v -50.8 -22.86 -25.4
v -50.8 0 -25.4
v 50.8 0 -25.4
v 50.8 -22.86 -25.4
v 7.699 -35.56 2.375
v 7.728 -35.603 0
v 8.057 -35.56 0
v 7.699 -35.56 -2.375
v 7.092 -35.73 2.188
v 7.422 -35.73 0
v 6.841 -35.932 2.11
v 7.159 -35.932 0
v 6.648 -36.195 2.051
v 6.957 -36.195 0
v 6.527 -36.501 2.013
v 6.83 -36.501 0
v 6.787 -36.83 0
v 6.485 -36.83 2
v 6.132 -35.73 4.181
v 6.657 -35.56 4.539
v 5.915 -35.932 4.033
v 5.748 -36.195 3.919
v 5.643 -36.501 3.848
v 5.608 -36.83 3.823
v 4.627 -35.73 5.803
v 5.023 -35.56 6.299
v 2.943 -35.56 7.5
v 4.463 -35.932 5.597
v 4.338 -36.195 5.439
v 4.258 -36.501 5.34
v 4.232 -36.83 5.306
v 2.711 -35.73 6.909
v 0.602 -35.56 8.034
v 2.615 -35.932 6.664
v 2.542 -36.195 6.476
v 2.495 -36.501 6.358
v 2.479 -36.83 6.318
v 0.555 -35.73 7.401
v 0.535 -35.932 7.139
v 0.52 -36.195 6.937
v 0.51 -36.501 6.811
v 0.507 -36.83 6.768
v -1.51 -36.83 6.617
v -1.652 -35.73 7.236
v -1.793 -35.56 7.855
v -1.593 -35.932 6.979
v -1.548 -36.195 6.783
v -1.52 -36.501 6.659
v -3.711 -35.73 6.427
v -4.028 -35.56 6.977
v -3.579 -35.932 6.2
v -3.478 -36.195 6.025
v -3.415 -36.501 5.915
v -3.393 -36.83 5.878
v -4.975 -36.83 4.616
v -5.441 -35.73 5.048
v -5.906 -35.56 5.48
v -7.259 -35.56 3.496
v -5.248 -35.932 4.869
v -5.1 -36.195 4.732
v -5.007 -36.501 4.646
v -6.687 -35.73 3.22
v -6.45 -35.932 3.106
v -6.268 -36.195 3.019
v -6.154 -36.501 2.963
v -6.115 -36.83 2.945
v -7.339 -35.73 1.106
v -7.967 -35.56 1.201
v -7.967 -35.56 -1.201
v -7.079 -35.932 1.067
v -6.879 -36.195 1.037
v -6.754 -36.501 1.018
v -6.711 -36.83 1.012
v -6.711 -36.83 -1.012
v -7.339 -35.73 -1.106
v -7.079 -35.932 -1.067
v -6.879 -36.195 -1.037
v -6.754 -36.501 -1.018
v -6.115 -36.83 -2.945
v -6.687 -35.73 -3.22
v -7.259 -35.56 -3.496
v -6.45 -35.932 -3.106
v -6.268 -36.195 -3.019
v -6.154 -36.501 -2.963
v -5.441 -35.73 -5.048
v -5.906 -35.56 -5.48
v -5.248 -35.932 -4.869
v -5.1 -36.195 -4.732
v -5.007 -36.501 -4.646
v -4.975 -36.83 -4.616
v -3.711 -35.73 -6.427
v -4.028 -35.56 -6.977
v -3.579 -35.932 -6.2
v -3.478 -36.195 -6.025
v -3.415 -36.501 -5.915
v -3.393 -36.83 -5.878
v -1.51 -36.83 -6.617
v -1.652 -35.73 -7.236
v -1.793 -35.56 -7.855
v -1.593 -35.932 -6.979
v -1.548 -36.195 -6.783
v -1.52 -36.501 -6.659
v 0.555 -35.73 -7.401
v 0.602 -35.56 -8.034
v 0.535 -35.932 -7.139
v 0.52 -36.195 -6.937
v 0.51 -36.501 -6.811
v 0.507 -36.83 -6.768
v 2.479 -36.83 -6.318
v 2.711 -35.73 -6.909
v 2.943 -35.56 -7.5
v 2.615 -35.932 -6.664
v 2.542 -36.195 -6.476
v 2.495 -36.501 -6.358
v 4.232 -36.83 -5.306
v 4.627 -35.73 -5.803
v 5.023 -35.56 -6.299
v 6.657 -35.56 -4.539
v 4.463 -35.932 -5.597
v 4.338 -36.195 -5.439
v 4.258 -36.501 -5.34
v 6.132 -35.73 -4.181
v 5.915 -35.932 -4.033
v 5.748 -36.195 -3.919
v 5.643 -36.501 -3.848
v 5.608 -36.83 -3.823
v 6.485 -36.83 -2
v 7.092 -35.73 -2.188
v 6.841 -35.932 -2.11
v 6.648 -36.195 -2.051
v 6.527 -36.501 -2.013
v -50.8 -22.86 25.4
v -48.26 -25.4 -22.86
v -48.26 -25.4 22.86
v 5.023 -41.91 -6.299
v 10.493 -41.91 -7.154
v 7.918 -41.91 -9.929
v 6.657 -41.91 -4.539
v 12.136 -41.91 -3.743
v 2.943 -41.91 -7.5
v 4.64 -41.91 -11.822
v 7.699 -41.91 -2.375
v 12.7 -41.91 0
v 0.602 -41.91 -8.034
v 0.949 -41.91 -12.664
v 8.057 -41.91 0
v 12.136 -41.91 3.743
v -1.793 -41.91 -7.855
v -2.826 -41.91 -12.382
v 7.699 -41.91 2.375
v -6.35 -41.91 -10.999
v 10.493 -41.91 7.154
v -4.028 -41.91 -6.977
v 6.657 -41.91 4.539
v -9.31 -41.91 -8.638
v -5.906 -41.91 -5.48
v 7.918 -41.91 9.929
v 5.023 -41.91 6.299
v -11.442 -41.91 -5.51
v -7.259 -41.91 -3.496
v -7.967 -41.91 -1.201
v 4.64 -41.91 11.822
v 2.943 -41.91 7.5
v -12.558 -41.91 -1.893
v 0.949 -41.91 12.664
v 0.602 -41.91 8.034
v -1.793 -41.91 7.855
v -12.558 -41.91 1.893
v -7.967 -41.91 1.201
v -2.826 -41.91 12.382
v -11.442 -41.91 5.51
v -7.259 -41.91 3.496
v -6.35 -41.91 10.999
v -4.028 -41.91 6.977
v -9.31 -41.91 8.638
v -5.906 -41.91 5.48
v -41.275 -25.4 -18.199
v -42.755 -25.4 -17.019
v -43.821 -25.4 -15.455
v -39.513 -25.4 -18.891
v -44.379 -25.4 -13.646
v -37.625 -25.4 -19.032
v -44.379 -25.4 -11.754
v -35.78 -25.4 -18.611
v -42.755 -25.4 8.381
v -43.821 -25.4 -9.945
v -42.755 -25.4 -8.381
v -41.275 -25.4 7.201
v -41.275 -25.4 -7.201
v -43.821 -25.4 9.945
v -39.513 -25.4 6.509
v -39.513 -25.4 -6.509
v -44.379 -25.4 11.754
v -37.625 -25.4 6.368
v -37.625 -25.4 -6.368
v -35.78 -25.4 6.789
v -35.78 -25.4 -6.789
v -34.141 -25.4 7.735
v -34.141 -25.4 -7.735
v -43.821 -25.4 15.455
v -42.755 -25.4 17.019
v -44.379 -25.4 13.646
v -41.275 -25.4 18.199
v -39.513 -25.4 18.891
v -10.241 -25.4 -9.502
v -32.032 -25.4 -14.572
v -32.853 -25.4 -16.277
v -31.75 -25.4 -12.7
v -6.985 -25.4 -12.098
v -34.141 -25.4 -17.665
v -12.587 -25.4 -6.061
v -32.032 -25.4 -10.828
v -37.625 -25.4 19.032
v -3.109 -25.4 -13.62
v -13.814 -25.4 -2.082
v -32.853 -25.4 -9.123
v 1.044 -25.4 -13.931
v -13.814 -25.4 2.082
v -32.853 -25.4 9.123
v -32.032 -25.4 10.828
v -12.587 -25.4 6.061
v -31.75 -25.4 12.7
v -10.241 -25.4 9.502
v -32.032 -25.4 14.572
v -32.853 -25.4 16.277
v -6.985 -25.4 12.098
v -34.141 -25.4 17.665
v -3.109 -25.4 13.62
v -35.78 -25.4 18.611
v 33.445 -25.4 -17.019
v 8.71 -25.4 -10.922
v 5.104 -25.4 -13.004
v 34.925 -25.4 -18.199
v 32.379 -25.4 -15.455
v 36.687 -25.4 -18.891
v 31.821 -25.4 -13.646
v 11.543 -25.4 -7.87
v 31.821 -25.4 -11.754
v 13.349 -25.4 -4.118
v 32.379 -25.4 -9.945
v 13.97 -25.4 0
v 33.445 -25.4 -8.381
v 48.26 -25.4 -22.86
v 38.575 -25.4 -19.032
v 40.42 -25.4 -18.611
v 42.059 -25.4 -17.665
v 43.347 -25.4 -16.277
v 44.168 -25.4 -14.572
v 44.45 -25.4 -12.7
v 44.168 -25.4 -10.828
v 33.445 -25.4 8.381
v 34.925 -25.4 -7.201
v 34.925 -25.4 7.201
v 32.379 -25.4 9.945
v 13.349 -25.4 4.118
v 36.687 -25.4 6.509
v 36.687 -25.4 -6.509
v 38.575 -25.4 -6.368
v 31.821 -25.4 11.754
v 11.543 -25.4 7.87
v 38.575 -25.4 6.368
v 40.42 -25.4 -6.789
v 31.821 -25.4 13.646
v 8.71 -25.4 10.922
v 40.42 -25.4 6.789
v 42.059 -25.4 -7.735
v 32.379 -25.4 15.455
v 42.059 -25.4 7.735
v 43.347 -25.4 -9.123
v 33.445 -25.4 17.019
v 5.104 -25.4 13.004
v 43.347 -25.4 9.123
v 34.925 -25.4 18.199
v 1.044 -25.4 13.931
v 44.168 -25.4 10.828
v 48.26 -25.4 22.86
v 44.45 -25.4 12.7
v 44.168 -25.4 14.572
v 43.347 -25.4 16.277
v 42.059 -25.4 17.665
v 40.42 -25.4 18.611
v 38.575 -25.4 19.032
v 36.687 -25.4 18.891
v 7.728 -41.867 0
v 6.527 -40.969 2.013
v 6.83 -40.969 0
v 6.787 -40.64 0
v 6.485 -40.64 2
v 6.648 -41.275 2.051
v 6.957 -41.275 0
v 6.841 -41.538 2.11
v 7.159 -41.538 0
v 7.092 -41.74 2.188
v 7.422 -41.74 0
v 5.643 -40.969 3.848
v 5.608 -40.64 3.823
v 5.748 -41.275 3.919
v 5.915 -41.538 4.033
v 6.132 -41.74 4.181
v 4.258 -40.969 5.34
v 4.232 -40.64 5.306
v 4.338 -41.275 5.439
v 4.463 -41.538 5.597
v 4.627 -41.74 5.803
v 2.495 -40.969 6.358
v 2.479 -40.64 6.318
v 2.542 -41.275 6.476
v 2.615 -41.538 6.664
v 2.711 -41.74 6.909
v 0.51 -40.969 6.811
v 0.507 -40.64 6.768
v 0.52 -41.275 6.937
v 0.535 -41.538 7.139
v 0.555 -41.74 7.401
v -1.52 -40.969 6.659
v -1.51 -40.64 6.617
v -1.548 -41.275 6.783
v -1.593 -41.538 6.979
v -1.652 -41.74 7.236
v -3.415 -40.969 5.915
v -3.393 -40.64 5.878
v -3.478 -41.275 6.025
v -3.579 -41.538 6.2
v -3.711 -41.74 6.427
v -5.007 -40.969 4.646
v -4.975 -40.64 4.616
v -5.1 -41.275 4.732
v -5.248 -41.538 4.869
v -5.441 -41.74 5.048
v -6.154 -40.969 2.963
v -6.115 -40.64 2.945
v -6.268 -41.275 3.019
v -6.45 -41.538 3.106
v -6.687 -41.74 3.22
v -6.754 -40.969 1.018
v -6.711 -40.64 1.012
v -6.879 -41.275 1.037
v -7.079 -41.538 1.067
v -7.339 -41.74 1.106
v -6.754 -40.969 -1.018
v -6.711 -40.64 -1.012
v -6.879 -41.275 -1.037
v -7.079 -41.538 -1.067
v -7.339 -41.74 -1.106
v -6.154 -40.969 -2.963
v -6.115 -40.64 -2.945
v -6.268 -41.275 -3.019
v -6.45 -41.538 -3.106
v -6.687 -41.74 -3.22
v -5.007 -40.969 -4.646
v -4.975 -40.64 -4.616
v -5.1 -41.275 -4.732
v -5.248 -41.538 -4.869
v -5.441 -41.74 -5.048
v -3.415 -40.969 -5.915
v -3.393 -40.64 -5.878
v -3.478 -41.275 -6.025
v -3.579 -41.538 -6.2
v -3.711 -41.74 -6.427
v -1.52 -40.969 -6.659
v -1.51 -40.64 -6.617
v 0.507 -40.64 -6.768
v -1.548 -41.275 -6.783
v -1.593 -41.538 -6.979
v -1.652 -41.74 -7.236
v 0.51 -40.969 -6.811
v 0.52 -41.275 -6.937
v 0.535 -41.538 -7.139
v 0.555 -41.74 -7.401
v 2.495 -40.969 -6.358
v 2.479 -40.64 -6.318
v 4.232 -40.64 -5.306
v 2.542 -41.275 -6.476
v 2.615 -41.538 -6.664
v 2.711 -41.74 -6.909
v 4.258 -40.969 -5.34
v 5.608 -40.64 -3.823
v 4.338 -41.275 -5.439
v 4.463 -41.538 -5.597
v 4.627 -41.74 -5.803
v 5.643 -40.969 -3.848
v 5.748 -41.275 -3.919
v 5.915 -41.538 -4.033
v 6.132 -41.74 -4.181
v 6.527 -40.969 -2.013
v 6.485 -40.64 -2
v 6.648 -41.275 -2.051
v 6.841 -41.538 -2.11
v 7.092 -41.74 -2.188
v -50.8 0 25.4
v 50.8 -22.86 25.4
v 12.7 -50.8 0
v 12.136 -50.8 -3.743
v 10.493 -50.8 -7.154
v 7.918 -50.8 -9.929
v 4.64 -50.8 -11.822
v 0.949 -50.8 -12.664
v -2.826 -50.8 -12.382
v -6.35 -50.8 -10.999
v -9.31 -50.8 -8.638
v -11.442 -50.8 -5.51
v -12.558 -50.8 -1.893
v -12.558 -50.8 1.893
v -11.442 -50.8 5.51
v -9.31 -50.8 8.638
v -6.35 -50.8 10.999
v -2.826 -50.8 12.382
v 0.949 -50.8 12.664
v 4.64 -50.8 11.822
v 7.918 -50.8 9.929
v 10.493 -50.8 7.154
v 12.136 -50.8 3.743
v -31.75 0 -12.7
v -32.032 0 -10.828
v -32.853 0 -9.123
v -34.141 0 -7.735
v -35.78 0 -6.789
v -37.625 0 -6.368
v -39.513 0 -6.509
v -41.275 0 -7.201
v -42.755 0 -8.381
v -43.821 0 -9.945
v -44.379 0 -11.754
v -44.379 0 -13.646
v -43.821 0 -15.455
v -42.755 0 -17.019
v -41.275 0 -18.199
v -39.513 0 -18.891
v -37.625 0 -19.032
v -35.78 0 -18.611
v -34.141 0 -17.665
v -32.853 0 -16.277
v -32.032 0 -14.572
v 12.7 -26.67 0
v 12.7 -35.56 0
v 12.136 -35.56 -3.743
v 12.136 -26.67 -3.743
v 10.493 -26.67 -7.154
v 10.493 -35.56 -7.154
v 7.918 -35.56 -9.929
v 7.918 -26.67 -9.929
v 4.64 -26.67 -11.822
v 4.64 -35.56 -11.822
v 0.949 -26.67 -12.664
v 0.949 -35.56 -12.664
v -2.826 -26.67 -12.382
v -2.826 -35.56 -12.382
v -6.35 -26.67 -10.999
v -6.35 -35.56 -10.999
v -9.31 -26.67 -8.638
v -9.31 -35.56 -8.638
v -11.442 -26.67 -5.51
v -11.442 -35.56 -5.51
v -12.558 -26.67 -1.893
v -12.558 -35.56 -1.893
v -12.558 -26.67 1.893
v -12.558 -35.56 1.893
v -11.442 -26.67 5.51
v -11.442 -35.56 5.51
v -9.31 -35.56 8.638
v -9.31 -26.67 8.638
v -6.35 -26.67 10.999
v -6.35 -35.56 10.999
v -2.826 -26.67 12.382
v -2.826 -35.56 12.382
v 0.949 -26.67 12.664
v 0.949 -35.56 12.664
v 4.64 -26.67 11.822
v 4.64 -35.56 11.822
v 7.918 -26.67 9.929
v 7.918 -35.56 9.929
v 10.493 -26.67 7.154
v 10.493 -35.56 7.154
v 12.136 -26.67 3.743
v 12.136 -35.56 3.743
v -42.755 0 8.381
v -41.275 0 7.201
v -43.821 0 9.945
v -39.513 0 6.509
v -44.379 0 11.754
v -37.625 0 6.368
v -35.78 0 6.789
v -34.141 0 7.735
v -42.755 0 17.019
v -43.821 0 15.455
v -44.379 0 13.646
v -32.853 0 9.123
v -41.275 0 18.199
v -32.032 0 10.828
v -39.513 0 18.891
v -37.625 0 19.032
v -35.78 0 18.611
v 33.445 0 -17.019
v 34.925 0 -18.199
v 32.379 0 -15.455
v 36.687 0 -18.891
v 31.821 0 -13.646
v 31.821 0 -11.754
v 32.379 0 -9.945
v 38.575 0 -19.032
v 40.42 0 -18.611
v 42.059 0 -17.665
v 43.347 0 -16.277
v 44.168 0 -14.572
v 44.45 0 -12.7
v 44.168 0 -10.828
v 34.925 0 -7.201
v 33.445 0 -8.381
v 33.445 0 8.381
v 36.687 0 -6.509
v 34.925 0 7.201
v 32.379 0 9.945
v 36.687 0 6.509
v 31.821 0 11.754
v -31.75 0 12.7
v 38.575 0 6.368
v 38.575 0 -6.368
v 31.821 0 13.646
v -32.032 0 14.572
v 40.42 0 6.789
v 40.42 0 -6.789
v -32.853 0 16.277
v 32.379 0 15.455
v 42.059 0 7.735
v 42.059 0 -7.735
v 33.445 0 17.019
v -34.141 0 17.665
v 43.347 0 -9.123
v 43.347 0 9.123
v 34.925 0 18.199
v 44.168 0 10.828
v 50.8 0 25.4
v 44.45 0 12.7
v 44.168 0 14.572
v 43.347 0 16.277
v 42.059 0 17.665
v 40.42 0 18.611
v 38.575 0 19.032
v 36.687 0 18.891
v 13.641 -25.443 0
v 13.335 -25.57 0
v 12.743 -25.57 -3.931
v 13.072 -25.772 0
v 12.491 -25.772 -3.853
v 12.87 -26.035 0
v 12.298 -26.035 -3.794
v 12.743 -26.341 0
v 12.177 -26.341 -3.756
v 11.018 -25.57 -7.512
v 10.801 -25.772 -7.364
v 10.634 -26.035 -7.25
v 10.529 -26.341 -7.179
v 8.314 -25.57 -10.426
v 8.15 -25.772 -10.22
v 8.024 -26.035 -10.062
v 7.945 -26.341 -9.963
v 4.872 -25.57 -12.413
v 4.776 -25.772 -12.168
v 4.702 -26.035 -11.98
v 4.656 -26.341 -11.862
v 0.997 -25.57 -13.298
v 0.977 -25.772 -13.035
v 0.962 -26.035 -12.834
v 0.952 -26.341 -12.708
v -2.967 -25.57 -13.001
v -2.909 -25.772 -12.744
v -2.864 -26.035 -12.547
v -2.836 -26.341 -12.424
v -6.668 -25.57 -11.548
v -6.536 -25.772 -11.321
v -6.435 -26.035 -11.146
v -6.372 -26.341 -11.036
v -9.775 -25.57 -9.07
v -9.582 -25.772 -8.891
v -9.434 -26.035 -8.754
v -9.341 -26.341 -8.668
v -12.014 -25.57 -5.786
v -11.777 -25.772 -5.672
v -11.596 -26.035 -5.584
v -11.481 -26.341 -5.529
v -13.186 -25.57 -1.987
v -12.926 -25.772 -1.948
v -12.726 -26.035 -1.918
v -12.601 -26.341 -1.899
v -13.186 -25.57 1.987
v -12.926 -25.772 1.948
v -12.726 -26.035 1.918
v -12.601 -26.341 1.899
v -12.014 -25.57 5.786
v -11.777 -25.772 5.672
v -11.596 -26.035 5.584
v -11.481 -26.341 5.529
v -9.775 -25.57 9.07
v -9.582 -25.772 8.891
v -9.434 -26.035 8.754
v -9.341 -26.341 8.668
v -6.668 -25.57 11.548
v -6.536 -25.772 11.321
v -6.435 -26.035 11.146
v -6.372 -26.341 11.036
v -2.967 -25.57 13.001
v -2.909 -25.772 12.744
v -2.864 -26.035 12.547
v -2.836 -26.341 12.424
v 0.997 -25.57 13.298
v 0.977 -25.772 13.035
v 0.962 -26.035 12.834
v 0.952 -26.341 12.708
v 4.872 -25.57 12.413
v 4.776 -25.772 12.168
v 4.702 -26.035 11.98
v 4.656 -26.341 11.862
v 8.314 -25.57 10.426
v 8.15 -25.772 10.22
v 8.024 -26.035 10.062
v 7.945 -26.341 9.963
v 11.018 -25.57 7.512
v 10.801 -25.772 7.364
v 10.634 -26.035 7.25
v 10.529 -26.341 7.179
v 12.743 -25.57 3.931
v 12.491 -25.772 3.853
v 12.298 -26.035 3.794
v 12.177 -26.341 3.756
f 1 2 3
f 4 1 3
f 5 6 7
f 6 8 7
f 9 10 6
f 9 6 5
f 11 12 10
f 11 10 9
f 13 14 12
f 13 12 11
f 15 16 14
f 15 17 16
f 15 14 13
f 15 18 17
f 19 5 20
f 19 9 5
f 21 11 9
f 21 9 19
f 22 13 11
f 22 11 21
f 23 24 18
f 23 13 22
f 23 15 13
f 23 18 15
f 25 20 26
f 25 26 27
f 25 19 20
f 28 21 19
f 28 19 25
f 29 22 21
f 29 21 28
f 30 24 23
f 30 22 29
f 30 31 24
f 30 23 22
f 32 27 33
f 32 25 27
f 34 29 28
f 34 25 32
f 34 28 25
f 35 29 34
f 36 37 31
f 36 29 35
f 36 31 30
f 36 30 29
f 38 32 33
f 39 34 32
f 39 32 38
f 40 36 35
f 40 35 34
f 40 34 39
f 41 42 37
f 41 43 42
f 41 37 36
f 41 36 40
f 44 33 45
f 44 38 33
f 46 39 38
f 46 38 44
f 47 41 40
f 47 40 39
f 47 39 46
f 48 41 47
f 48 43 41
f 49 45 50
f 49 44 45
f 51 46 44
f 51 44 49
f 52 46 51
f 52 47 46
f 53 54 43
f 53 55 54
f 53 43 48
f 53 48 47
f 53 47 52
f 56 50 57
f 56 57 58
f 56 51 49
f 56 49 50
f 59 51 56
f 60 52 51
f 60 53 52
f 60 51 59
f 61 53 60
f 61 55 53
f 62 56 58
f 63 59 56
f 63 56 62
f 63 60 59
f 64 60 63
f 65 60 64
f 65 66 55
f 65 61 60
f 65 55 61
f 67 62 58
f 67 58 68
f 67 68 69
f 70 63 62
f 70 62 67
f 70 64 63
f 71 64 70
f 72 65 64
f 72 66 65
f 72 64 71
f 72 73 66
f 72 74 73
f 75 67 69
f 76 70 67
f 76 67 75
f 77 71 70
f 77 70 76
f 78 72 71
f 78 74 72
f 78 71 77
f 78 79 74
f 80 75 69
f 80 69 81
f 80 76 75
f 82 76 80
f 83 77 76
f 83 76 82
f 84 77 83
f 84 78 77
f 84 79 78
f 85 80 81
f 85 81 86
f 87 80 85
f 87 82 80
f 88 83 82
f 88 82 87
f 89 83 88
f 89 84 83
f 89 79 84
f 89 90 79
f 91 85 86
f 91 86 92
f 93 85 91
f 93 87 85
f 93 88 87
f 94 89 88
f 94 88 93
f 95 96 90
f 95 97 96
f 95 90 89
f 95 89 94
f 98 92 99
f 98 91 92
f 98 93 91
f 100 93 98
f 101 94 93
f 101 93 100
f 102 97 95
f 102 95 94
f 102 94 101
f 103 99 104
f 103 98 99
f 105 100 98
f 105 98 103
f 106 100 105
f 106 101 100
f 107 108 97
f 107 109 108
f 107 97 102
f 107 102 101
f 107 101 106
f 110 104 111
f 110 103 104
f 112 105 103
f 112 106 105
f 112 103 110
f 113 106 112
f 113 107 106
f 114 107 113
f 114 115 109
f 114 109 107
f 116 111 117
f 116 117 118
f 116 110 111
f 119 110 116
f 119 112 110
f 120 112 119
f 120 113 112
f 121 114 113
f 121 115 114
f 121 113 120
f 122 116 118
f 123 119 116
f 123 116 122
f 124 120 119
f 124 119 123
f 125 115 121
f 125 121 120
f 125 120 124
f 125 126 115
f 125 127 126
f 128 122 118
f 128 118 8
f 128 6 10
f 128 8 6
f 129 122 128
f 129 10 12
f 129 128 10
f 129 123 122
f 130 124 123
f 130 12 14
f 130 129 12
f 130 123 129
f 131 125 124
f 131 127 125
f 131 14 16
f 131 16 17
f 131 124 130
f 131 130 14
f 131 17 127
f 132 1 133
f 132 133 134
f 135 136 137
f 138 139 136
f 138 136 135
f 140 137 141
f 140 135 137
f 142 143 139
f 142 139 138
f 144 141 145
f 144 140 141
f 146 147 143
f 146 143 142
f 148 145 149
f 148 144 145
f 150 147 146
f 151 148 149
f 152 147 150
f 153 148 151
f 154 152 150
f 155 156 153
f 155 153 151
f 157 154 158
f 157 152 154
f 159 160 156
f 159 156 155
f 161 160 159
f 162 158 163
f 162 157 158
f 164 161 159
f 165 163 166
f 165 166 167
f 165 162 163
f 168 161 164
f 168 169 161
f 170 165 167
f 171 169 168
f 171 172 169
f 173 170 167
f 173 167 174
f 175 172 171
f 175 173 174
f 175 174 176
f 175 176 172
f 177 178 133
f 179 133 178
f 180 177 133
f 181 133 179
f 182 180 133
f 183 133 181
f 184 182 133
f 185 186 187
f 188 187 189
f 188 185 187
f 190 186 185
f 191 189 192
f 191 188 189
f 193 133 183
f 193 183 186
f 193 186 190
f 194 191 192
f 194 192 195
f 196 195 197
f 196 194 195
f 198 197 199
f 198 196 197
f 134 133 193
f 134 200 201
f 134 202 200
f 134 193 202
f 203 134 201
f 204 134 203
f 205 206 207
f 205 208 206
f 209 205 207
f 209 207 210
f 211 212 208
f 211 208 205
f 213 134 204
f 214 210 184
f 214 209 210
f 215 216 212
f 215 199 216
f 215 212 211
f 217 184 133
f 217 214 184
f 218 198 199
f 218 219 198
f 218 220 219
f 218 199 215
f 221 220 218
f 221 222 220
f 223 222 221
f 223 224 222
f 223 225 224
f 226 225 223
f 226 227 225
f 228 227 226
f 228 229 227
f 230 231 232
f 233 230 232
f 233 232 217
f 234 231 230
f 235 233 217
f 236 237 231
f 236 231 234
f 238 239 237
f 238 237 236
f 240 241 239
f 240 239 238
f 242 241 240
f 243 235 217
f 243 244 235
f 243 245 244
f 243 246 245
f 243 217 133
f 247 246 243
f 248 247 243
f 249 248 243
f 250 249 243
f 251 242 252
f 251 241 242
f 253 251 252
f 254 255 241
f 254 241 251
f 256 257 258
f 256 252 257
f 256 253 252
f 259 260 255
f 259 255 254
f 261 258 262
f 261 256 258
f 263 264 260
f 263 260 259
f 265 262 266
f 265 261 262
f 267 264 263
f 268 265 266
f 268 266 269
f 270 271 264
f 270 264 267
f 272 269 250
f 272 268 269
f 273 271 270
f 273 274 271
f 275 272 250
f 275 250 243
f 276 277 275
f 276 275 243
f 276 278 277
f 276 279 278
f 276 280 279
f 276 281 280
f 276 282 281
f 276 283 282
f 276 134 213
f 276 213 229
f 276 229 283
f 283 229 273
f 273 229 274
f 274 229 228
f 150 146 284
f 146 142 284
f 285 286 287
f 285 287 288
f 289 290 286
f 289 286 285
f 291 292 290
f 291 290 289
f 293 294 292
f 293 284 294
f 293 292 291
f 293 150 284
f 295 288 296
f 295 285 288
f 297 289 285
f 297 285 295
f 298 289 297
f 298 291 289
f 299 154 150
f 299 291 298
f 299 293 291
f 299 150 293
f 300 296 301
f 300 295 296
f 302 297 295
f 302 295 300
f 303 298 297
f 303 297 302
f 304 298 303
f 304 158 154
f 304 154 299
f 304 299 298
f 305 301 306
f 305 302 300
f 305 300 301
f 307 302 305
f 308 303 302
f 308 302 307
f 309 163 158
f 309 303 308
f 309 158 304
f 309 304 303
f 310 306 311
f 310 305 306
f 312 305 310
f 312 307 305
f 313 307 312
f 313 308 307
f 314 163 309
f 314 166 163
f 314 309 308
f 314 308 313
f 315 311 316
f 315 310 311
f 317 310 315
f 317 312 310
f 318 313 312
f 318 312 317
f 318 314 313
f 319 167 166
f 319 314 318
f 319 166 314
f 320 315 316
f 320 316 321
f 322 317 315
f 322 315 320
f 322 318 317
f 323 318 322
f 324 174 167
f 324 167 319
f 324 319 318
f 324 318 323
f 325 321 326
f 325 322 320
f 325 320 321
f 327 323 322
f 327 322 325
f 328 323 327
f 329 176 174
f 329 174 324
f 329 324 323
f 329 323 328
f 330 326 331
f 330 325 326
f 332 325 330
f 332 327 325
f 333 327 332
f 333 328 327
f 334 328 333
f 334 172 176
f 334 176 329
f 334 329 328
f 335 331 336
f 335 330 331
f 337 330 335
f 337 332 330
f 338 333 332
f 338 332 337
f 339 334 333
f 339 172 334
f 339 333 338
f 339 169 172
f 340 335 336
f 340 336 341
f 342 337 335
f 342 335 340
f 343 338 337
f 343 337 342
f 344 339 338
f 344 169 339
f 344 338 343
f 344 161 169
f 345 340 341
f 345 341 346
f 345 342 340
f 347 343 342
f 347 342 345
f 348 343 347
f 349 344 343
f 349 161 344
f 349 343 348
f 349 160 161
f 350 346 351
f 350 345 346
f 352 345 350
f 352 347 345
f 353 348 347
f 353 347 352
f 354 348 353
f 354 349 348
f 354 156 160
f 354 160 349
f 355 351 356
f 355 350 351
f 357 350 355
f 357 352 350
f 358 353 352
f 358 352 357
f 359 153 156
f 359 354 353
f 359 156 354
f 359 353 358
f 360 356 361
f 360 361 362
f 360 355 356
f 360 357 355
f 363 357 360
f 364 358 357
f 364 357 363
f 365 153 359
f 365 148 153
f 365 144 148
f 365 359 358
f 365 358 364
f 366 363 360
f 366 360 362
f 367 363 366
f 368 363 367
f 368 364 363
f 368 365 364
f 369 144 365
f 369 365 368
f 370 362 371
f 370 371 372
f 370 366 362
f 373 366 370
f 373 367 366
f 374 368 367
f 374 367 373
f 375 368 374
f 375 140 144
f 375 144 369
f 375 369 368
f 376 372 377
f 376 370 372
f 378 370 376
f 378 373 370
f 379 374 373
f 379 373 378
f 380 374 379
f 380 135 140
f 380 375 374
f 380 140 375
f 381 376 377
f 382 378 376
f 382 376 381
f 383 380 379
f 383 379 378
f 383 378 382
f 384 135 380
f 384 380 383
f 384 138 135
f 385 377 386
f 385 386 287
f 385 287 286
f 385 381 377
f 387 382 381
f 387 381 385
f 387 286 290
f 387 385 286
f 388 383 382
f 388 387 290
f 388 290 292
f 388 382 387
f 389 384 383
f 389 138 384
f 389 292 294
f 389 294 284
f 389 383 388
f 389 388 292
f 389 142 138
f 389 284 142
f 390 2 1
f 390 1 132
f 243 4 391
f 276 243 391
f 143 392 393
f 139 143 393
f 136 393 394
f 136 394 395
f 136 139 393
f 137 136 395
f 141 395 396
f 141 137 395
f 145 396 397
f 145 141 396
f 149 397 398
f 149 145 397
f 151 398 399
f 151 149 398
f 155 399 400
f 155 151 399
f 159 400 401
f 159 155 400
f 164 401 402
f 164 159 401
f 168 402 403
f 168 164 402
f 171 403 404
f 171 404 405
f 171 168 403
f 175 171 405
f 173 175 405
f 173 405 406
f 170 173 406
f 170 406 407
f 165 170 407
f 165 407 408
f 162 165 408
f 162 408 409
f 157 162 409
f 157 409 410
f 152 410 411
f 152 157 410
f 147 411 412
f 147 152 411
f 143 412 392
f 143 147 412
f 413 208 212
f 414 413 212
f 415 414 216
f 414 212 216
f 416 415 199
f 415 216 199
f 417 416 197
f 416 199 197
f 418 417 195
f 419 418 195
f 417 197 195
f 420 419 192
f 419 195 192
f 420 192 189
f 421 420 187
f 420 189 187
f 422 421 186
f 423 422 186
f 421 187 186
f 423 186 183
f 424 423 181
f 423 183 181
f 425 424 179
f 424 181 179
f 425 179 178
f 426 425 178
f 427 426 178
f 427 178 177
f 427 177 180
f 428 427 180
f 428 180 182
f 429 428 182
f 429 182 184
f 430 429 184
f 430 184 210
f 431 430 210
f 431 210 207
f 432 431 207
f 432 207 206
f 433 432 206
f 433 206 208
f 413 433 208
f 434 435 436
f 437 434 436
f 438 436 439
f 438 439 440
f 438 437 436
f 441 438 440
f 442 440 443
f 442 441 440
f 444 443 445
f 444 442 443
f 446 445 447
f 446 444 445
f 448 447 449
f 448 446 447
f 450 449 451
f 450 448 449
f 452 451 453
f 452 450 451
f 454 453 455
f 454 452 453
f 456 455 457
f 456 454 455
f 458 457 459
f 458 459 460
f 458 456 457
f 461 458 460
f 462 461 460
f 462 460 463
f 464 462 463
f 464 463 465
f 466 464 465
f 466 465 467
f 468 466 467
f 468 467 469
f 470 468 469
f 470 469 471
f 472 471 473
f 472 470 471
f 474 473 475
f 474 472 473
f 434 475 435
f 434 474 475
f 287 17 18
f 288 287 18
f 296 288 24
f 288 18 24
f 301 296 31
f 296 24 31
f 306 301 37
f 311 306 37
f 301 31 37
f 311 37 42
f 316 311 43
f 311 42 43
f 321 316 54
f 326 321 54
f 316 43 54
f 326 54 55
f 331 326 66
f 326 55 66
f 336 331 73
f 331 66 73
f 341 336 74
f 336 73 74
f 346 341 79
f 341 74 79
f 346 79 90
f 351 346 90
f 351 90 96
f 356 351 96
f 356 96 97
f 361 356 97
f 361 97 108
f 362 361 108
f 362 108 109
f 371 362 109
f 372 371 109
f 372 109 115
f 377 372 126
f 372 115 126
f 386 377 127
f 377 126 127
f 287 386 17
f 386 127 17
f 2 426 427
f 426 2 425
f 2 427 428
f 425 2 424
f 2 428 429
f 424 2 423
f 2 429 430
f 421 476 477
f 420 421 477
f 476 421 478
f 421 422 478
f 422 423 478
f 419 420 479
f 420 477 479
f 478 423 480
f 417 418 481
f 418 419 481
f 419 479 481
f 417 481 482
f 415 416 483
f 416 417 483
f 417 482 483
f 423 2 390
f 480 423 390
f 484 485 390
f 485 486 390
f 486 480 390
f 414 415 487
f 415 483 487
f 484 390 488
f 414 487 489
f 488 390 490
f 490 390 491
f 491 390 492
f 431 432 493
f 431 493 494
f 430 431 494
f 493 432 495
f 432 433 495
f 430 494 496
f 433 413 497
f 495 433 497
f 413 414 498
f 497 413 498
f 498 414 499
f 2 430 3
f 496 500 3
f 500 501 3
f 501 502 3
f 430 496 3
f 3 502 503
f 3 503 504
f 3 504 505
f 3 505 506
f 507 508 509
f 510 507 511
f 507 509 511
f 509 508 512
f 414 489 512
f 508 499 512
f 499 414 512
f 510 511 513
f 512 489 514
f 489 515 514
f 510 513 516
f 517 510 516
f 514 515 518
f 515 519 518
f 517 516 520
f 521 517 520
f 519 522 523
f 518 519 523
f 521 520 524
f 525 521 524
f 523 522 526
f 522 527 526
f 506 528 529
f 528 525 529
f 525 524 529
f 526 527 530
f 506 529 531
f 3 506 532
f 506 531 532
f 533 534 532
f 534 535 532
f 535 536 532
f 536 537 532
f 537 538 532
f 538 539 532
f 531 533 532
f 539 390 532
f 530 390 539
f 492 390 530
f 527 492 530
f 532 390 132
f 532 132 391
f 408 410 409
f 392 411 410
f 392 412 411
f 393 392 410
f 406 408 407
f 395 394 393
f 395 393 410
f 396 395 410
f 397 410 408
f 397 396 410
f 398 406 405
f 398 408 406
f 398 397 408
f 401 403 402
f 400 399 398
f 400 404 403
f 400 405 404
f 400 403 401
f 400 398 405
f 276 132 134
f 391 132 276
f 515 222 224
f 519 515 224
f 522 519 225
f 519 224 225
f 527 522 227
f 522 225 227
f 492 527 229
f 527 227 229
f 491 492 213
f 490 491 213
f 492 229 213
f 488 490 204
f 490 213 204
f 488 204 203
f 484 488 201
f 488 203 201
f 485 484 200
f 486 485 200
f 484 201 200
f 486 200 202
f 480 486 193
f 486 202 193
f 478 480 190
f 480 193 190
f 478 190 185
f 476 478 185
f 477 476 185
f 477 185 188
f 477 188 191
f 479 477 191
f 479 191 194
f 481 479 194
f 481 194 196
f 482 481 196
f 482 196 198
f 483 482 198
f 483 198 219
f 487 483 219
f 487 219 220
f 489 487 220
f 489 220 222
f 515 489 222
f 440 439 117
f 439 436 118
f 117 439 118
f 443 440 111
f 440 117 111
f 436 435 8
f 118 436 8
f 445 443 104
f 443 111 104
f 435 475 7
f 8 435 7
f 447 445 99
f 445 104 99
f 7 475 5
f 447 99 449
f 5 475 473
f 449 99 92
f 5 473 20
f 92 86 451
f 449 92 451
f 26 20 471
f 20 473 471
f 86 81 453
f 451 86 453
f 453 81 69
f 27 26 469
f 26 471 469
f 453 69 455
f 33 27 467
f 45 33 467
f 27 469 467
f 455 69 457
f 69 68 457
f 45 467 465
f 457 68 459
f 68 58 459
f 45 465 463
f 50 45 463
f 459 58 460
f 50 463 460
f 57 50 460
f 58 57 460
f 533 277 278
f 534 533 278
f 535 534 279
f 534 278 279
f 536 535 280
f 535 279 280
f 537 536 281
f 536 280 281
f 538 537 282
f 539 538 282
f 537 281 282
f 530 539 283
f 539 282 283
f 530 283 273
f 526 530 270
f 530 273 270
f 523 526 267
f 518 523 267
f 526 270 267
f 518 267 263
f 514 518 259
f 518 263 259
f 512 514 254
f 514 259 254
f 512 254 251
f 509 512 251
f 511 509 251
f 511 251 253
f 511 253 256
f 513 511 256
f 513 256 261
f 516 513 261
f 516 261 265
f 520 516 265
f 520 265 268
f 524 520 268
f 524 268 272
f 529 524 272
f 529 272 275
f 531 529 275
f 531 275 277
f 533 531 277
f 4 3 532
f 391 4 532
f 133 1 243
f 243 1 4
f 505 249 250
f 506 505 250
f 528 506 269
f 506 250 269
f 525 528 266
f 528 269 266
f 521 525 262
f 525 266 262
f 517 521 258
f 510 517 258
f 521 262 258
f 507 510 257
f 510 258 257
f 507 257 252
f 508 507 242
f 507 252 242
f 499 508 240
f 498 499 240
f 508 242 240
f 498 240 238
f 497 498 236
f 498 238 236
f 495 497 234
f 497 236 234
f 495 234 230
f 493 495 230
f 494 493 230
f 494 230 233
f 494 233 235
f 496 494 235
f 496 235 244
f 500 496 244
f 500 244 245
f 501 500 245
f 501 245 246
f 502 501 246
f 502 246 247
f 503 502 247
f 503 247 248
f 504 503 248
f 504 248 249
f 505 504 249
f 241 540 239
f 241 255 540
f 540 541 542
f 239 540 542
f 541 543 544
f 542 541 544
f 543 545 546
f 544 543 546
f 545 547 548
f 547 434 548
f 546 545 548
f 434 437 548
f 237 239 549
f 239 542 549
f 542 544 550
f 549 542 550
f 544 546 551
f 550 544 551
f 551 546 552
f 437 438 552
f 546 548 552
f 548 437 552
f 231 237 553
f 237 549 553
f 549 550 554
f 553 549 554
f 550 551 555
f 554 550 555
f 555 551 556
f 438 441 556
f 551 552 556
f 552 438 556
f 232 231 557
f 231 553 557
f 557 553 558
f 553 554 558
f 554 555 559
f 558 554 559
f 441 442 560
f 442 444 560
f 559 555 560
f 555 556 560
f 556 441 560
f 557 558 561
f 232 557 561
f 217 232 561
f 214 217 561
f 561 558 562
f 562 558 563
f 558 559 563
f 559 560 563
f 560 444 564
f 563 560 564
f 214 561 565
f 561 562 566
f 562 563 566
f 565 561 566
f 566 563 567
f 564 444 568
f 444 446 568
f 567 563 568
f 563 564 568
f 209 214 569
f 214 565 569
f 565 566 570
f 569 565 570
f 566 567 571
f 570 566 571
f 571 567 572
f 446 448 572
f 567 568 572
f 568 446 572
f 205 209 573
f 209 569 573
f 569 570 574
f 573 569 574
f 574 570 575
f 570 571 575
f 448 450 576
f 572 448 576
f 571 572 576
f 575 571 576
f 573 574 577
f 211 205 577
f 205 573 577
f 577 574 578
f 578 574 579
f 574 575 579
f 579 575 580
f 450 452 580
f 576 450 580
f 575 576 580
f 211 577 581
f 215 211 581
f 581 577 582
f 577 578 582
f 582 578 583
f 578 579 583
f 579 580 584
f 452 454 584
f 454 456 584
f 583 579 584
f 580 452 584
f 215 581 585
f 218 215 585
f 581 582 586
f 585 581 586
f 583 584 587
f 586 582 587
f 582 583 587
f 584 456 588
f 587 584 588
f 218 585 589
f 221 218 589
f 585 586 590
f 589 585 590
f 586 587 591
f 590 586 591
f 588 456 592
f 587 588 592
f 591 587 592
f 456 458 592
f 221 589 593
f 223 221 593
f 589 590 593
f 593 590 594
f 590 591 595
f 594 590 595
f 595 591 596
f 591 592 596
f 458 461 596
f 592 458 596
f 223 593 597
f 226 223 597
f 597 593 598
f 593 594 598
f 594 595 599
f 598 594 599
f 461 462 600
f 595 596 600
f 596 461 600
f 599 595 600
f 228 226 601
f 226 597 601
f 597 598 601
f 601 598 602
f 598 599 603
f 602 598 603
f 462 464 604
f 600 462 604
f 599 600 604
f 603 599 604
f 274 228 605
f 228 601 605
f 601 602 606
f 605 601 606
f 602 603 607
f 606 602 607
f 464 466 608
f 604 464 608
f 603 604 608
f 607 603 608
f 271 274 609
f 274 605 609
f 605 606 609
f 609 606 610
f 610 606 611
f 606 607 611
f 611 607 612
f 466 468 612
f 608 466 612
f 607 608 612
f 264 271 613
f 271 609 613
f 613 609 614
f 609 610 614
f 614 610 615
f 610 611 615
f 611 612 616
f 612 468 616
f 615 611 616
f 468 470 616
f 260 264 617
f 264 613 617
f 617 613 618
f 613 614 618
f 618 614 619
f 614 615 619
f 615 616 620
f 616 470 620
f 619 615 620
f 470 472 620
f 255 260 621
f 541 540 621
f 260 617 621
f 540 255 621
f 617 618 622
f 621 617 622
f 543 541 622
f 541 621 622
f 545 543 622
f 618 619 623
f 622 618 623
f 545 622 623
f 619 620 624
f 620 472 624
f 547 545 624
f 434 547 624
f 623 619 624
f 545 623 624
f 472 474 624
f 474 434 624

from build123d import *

# Parameters (mm, degrees)
F0_W     = 101.6
F0_H     = 50.8
F1_DEPTH = 25.4
F2_R     = 6.35
F3_DEPTH = 25.401
F4_W     = 12.7
F4_H     = 25.4
F6_W     = 10.16
F6_H     = 6.35
F8_R     = 1.27
F9_SIZE  = 2.54


with BuildPart() as f1:
    # F0 (on Front) → F1 (new body)
    with BuildSketch(Plane.XZ):
        Rectangle(F0_W, F0_H)
    extrude(amount=F1_DEPTH)

    # F2 (on face) → F3 (cut, through all)
    with BuildSketch(Plane.XZ.offset(25.4)):
        with Locations((-38.1, 12.7)):
            Circle(F2_R)
        with Locations((-38.1, -12.7)):
            Circle(F2_R)
        with Locations((38.1, 12.7)):
            Circle(F2_R)
        with Locations((38.1, -12.7)):
            Circle(F2_R)
    extrude(amount=-F3_DEPTH, mode=Mode.SUBTRACT)

    # F4 (on Top) → F5 (revolve)
    with BuildSketch(Plane.XY):
        with Locations((6.35, -38.1)):
            Rectangle(F4_W, F4_H)
    revolve(axis=Axis((0, -38.1, 0), (0, 1, 0)))

    # F6 (on Top) → F7 (revolve, cut)
    with BuildSketch(Plane.XY):
        with Locations((11.866805, -38.735)):
            Rectangle(F6_W, F6_H)
    revolve(axis=Axis((0, -36.219459, 0), (0, -1, 0)), mode=Mode.SUBTRACT)

    # F8
    f8_edges = [f1.edges().sort_by_distance(p)[0] for p in [
        (-12.7, -25.4, 0),
        (-6.786805, -41.91, 0),
        (-6.786805, -35.56, 0),
    ]]
    fillet(f8_edges, radius=F8_R)

    # F9
    f9_edges = [f1.edges().sort_by_distance(p)[0] for p in [
        (0, -25.4, -25.4),
        (0, -25.4, 25.4),
        (-50.8, -25.4, 0),
        (50.8, -25.4, 0),
    ]]
    chamfer(f9_edges, length=F9_SIZE)


solid = f1.part
